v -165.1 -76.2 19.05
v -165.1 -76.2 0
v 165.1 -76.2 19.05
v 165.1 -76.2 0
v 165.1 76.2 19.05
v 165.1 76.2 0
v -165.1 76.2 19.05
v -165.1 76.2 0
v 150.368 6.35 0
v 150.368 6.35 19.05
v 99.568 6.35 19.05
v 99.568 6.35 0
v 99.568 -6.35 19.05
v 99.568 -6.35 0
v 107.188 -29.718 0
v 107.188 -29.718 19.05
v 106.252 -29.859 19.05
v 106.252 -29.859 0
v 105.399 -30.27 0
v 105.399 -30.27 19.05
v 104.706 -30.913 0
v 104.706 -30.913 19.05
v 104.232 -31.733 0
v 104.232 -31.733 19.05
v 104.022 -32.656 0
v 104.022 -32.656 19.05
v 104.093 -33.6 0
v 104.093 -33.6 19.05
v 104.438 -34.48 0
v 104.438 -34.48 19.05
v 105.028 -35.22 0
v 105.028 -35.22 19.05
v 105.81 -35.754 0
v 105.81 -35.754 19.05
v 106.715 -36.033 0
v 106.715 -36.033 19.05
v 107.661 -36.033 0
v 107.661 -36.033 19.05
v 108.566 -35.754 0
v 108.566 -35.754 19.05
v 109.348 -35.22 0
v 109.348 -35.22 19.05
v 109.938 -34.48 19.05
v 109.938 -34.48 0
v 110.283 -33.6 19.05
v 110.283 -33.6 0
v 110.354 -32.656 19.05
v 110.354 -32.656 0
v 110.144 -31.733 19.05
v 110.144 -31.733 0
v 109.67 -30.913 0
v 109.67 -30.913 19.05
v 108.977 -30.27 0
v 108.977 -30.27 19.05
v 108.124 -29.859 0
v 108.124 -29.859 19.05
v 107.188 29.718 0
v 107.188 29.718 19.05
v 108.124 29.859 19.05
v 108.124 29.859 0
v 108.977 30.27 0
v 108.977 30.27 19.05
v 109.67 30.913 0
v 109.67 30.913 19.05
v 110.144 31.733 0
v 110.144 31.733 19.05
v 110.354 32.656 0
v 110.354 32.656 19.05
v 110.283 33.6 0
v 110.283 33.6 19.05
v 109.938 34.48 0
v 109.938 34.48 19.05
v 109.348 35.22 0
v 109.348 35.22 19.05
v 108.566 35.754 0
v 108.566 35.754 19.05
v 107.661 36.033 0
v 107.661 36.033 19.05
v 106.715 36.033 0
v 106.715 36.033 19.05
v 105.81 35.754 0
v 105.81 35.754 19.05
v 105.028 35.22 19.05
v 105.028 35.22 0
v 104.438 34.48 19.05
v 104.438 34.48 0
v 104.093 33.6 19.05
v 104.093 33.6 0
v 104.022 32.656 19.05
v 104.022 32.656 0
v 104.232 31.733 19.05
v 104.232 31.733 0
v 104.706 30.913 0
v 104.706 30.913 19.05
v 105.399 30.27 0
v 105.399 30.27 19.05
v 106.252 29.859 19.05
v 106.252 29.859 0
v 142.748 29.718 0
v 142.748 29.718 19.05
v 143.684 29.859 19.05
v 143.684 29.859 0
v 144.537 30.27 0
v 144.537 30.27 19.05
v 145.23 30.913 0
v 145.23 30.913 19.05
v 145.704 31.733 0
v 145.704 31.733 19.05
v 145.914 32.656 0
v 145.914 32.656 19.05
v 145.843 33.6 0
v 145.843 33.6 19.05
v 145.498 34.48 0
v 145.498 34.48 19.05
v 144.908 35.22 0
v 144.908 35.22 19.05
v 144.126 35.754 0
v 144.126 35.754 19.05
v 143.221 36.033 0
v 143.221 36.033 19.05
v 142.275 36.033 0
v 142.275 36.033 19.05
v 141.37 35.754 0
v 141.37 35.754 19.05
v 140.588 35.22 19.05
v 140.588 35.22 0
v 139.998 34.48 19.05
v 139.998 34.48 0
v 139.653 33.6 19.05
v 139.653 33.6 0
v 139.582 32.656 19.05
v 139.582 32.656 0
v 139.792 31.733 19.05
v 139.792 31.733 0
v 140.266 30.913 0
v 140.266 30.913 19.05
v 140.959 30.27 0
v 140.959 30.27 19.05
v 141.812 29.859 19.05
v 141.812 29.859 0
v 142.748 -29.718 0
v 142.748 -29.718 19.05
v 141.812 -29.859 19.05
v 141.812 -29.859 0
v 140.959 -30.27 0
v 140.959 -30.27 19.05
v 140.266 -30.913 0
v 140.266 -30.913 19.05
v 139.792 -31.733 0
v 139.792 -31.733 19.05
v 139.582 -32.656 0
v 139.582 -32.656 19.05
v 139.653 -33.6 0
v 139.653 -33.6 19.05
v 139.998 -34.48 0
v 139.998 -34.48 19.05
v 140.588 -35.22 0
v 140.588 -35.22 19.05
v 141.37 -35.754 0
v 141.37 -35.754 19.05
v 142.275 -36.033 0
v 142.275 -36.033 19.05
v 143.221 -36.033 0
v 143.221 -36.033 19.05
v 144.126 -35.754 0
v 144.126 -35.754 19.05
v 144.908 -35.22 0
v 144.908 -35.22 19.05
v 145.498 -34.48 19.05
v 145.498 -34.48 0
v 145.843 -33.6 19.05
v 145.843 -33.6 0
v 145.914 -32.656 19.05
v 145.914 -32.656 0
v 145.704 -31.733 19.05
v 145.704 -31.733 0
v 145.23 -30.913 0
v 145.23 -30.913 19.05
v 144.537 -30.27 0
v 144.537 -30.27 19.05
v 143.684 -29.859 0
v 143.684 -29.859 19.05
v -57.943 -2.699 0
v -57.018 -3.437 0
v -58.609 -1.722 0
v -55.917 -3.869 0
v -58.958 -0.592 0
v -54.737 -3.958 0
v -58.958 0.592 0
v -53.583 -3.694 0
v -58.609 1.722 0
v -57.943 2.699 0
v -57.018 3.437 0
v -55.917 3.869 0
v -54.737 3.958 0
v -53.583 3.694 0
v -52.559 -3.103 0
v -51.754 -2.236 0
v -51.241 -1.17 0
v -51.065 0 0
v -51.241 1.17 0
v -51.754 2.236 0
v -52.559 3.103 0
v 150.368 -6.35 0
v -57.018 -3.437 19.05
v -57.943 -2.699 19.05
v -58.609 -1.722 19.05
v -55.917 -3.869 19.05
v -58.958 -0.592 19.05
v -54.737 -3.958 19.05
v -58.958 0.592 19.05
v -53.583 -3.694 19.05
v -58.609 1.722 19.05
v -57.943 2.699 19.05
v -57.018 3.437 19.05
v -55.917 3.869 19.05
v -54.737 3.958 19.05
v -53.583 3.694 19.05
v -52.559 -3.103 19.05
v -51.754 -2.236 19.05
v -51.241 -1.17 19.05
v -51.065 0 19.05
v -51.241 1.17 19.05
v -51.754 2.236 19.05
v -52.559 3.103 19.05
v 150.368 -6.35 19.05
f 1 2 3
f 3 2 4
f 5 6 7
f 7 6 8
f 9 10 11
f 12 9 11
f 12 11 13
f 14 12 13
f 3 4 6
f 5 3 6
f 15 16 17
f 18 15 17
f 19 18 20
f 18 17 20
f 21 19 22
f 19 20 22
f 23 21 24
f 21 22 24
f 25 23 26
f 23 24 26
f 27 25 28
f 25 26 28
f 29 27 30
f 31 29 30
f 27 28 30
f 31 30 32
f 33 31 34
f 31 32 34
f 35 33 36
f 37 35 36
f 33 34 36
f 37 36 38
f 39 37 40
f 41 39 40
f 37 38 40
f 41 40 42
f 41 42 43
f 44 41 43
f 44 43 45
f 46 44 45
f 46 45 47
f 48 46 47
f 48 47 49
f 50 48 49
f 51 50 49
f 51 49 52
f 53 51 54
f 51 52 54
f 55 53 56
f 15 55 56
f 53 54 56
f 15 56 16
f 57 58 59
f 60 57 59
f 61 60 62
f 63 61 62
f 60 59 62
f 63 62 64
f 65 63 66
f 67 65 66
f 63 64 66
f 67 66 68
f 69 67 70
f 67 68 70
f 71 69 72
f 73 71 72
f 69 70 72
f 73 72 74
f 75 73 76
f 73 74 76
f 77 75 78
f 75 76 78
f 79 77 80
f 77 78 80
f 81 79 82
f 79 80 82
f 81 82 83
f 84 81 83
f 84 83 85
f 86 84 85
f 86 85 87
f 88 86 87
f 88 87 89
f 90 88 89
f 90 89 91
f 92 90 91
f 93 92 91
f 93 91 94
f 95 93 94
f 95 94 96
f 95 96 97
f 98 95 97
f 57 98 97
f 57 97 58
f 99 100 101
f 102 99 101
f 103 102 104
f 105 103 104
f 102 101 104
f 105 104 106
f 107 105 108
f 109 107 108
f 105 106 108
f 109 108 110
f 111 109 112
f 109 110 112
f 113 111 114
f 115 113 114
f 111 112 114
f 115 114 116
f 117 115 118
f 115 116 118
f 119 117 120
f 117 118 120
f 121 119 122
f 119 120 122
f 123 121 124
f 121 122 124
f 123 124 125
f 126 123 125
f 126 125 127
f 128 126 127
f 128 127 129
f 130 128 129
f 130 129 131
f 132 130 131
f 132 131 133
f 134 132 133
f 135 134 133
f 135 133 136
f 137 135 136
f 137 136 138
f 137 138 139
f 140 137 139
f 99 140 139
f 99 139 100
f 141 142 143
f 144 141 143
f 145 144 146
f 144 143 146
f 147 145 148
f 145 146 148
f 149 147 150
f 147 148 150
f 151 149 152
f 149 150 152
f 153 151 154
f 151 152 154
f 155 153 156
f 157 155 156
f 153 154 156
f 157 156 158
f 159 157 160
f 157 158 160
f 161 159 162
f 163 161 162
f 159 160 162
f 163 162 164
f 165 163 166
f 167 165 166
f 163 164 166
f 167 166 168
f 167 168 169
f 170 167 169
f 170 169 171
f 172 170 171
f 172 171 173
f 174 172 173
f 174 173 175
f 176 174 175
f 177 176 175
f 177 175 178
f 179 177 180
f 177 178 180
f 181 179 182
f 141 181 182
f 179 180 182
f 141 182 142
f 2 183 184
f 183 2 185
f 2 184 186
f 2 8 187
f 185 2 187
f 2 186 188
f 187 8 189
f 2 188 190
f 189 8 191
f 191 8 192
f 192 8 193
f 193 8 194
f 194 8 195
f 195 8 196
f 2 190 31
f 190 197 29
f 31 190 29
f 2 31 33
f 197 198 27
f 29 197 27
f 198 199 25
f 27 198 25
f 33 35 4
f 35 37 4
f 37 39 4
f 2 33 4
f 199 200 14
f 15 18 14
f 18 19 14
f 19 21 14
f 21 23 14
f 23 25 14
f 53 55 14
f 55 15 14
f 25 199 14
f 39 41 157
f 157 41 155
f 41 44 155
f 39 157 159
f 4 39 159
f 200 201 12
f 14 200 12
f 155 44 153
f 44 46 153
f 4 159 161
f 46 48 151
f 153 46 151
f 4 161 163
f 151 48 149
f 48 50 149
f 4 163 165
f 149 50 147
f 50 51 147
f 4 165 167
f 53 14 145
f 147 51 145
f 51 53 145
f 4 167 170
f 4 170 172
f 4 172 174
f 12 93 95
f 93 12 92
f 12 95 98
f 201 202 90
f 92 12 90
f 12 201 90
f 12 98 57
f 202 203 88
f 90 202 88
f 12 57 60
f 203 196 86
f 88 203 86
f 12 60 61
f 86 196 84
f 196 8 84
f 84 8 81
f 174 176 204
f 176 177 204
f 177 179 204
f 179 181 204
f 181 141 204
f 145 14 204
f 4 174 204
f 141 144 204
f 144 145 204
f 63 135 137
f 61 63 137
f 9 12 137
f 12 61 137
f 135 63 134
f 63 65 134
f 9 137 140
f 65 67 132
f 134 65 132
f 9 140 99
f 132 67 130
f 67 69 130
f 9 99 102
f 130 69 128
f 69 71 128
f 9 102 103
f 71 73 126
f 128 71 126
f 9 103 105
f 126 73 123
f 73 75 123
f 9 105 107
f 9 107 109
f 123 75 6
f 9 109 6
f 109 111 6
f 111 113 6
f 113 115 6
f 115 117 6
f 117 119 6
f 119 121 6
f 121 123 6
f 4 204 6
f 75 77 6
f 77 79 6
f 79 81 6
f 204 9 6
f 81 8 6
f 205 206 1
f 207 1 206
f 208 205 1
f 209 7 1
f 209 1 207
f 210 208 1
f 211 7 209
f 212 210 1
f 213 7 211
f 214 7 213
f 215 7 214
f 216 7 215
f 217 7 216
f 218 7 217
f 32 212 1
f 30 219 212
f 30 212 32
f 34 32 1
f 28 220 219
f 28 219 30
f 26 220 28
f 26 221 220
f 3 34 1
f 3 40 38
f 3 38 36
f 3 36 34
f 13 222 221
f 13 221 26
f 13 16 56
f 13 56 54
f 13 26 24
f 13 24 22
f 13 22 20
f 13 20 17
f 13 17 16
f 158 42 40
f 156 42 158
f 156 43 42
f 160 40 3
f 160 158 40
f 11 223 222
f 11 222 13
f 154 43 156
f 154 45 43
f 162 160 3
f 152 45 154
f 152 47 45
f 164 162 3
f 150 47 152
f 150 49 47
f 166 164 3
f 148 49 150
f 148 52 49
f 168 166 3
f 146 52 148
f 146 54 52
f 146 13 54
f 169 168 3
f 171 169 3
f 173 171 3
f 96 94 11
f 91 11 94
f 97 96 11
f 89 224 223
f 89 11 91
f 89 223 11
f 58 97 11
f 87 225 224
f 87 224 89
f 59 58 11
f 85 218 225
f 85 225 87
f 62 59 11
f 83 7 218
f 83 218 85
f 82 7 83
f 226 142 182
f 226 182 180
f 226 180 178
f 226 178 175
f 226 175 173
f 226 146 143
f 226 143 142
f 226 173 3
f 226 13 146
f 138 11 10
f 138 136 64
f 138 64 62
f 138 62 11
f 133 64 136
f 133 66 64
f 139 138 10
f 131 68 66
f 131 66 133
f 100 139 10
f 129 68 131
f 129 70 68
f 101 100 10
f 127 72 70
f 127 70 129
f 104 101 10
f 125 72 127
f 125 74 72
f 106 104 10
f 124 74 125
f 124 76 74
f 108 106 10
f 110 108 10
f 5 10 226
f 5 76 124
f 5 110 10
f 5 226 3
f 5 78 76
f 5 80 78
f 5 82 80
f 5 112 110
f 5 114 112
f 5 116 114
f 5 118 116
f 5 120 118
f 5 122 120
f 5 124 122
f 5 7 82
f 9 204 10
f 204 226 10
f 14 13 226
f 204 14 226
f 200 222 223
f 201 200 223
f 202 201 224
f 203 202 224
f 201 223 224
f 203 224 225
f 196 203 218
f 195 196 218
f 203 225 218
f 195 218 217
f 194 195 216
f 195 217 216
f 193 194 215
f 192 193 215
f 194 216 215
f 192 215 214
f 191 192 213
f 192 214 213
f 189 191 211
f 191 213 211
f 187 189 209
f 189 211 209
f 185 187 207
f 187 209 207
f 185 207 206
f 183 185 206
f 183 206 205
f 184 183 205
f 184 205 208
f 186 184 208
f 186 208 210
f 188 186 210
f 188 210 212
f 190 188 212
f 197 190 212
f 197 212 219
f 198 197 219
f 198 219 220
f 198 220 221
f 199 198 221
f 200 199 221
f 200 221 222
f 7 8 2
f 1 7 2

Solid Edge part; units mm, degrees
sketch "Sketch1" plane through (0, 0, 0) normal (0, 0, 1) x (1, 0, 0)
  line L0 (-165.1, -76.2) -> (165.1, -76.2)
  line L1 (165.1, -76.2) -> (165.1, 76.2)
  line L2 (165.1, 76.2) -> (-165.1, 76.2)
  line L3 (-165.1, 76.2) -> (-165.1, -76.2)
  dimension "D1" = 330.2
  dimension "D2" = 152.4
extrude "Protrusion1" add sketch "Sketch1" along normal blind 19.05
sketch "Sketch2" plane through (0, 0, 19.05) normal (0, 0, 1) x (1, 0, 0)
  circle A0 centre (-55.0334, 0) radius 3.9688
  dimension "D1" = 110.0666
extrude "TripodTNutHole" cut sketch "Sketch2" against normal blind 50.8
sketch "Sketch3" plane through (0, 0, 19.05) normal (0, 0, 1) x (1, 0, 0)
  line L0 (99.568, -6.35) -> (150.368, -6.35)
  line L1 (150.368, -6.35) -> (150.368, 6.35)
  line L2 (150.368, 6.35) -> (99.568, 6.35)
  line L3 (99.568, 6.35) -> (99.568, -6.35)
  dimension "D1" = 264.668
  dimension "D2" = 50.8
  dimension "D3" = 12.7
extrude "ExtrudedCutout_2" cut sketch "Sketch3" against normal blind 25.4
sketch "Sketch4" plane through (0, 0, 19.05) normal (0, 0, 1) x (0, -1, 0)
  circle A0 centre (-32.893, 107.188) radius 3.175
  circle A1 centre (-32.893, 142.748) radius 3.175
  dimension "D1" = 32.893
  dimension "D2" = 14.732
  dimension "D3" = 22.352
  dimension "D4" = 32.893
  dimension "D5" = 35.56
extrude "MotorMountHoles12" cut sketch "Sketch4" against normal blind 25.4
mirror "Mirror1" about plane through (0, 0, 0) normal (0, -1, 0) of "MotorMountHoles12"
properties material "Wood, Oak"
